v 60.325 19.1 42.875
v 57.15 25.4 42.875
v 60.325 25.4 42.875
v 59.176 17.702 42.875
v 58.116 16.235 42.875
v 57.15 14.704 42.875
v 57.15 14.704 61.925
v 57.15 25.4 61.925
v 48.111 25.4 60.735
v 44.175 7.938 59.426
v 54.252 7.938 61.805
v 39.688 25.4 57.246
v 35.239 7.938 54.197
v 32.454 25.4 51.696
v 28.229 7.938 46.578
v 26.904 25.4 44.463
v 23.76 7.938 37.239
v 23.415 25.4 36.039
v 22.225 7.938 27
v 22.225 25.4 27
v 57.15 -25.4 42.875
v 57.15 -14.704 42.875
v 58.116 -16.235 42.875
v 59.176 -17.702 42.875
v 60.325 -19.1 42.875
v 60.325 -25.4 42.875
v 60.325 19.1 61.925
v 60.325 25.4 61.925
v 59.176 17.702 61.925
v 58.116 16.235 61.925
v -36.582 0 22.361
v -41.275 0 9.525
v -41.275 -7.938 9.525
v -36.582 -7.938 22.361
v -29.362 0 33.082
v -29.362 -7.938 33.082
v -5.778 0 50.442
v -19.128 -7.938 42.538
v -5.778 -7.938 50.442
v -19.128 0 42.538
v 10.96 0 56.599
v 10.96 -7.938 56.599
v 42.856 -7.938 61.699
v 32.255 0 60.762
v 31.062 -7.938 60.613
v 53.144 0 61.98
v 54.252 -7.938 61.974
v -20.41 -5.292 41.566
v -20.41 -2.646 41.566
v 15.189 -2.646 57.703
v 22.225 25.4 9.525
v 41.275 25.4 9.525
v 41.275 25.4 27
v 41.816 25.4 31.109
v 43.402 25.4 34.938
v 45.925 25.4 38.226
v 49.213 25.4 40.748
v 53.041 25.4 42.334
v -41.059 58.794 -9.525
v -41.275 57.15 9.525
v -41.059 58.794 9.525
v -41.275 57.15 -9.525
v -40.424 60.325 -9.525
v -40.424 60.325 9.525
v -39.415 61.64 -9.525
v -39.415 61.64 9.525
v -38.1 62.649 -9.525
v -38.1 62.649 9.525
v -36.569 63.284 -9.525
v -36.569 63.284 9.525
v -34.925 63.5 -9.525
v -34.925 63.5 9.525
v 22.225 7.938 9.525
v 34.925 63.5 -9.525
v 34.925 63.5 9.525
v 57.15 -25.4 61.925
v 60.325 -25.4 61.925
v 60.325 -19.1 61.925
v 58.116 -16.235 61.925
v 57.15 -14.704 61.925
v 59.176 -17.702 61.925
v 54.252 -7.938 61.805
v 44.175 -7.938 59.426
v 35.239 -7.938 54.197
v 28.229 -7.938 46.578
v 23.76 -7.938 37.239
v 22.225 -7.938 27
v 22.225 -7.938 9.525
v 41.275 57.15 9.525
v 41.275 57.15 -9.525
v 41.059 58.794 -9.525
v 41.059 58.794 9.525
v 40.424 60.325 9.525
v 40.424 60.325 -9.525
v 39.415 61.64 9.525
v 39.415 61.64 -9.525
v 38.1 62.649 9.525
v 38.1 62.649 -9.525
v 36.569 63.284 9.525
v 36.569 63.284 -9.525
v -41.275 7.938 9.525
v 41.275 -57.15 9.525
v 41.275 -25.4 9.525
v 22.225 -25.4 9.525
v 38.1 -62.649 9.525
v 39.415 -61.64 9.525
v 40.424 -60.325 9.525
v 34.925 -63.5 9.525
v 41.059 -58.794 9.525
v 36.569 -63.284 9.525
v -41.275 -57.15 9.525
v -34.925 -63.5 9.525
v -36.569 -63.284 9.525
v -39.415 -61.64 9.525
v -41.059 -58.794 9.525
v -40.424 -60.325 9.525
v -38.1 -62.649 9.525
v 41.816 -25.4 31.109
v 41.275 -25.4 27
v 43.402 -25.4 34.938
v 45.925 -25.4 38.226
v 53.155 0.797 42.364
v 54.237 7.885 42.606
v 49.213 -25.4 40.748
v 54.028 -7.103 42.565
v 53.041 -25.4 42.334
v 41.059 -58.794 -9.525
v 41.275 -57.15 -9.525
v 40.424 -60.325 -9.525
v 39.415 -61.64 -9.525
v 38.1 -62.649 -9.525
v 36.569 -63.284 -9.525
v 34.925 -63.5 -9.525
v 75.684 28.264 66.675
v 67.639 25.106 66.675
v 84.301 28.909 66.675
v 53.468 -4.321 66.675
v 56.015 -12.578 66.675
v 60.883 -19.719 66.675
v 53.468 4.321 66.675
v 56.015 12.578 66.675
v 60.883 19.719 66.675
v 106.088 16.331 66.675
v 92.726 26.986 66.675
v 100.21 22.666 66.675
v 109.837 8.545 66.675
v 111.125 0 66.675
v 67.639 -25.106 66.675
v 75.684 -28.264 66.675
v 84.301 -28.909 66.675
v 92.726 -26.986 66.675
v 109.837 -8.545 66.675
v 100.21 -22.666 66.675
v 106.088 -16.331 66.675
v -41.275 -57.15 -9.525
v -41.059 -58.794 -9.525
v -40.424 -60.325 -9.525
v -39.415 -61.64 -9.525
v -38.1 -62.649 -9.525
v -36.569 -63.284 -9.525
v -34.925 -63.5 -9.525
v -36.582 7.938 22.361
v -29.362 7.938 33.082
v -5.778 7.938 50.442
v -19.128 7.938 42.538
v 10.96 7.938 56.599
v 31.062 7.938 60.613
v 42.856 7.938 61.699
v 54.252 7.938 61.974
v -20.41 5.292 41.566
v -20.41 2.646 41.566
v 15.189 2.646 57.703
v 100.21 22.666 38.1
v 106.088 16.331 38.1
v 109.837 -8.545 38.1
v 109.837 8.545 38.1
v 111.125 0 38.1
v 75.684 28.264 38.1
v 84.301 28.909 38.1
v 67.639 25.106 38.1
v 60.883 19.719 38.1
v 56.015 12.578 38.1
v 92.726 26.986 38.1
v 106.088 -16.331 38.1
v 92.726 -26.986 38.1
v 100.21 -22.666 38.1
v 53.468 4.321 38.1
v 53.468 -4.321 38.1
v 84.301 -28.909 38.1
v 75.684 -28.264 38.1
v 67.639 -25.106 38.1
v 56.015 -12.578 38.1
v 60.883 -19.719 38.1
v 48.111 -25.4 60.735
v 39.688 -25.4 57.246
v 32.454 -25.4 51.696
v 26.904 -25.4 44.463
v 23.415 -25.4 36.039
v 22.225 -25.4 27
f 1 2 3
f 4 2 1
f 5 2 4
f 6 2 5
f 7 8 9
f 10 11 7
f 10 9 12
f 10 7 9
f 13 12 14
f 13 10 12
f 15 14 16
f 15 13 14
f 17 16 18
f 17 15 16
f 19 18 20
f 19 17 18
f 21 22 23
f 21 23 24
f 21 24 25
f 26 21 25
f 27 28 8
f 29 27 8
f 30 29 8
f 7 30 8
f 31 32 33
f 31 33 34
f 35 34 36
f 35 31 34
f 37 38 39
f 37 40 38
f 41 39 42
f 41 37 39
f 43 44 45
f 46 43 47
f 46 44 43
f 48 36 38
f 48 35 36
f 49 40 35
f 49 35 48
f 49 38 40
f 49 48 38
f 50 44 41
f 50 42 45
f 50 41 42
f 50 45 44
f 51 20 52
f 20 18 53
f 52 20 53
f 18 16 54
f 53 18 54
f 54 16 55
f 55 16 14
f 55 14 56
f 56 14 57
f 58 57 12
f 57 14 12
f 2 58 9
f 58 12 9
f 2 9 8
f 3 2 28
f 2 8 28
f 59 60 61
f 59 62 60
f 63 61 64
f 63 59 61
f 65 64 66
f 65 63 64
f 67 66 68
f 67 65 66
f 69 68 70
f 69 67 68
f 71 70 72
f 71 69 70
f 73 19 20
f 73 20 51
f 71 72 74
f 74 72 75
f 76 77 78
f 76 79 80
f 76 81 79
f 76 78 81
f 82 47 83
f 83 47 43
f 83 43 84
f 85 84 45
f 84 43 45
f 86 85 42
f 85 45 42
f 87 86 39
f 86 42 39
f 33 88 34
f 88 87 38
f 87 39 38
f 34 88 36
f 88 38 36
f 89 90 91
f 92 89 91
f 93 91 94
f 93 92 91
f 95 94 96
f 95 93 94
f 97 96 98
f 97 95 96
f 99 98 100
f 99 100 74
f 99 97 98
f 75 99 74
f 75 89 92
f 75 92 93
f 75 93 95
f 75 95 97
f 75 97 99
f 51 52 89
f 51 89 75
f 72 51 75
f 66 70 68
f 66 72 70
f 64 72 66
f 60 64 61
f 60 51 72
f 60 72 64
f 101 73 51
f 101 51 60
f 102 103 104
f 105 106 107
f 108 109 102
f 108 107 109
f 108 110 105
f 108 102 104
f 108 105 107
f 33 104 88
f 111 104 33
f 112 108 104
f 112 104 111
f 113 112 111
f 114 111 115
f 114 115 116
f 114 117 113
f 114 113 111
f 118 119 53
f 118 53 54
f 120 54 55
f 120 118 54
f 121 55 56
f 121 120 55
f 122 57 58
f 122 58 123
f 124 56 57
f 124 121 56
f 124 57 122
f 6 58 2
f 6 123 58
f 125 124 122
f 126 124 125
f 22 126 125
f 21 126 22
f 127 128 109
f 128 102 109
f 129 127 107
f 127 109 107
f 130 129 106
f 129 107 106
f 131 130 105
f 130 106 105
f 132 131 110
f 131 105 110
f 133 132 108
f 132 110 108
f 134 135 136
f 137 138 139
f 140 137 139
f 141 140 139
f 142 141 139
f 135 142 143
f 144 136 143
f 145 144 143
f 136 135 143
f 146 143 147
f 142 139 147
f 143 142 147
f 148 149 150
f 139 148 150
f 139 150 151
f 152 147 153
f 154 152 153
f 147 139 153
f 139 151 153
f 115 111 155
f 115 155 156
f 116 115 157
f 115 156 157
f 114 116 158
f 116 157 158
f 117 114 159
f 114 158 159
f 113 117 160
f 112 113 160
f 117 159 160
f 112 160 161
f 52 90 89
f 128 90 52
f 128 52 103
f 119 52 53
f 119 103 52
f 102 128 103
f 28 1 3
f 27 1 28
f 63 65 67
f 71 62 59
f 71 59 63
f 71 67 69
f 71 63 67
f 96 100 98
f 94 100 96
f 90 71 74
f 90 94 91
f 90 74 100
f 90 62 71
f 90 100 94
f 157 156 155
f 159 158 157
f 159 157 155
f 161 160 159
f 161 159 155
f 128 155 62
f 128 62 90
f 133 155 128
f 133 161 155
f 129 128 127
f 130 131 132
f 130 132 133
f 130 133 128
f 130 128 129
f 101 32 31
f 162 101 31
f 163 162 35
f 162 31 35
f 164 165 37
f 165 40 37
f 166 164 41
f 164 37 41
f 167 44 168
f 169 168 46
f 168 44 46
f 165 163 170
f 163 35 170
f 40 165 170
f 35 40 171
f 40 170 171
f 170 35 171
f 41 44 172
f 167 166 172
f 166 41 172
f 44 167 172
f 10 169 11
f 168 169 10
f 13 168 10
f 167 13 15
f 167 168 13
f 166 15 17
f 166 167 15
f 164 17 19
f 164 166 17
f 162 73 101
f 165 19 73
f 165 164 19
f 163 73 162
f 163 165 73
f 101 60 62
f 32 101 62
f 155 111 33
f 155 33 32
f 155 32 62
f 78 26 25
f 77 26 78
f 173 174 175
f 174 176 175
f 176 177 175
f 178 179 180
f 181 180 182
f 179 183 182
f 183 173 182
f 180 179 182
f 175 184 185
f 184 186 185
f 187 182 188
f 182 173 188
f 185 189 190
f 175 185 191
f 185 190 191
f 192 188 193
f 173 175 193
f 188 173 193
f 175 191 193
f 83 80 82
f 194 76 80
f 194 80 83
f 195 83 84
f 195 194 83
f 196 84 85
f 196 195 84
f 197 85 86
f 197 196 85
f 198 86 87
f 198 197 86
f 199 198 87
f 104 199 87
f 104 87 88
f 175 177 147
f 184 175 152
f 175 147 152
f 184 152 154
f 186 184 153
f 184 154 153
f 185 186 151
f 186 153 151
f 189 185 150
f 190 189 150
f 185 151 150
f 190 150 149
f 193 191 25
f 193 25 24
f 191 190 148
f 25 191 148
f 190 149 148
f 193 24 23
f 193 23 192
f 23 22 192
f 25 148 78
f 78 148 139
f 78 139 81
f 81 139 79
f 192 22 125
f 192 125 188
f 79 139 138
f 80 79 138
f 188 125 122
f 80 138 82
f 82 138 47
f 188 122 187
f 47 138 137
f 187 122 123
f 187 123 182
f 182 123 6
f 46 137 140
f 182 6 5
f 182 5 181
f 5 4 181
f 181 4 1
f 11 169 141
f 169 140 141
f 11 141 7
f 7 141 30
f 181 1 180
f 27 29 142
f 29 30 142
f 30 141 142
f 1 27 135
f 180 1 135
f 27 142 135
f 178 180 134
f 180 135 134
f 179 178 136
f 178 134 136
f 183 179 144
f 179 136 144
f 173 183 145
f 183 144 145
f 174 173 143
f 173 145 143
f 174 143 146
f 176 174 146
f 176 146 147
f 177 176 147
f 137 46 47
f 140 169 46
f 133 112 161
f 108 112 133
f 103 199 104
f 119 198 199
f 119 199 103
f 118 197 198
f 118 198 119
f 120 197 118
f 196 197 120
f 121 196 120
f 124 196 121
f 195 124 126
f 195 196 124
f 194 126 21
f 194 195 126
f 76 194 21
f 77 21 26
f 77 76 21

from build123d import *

# Parameters (mm, degrees)
F1_DEPTH = 63.5
F2_DEPTH = 25.4
F3_DEPTH = 7.9375
F5_R     = 6.35


with BuildPart() as f1:
    # F0 (on Front) → F1 (new body, symmetric)
    with BuildSketch(Plane.XZ):
        Polygon((-41.275, 9.525), (-41.275, -9.525), (41.275, -9.525), (41.275, 9.525), (22.225, 9.525), align=None)
    extrude(amount=F1_DEPTH, both=True)

    # F0 (on Front) → F2 (join, symmetric)
    with BuildSketch(Plane.XZ):
        with BuildLine():
            Line((22.225, 9.525), (41.275, 9.525))
            Line((41.275, 9.525), (41.275, 27.0002))
            ThreePointArc((41.275, 27.0002), (45.92468, 38.22552), (57.15, 42.8752))
            Line((57.15, 42.8752), (60.325, 42.8752))
            Line((60.325, 42.8752), (60.325, 61.9252))
            Line((60.325, 61.9252), (57.15, 61.9252))
            ThreePointArc((57.15, 61.9252), (32.454296, 51.695904), (22.225, 27.0002))
            Line((22.225, 27.0002), (22.225, 9.525))
        make_face()
    extrude(amount=F2_DEPTH, both=True)

    # F0 (on Front) → F3 (join, symmetric)
    with BuildSketch(Plane.XZ):
        with BuildLine():
            add(Edge.make_bspline(
                [(-41.275, 9.525), (-31.276178, 51.95152), (19.80542, 62.86972), (57.15, 61.9252)],
                knots=[0, 0, 0, 0, 111.504536, 111.504536, 111.504536, 111.504536], degree=3))
            Line((-41.275, 9.525), (22.225, 9.525))
            Line((22.225, 9.525), (22.225, 27.0002))
            ThreePointArc((22.225, 27.0002), (32.454296, 51.695904), (57.15, 61.9252))
        make_face()
    extrude(amount=F3_DEPTH, both=True)

    # F0 (on Front) → F4 (revolve)
    with BuildSketch(Plane.XZ):
        Polygon((82.134529, 66.675), (82.134529, 61.9252), (82.134529, 42.8752), (82.134529, 38.1), (111.125, 38.1), (111.125, 66.675), align=None)
    revolve(axis=Axis((82.134529, 0, 52.3875), (0, 0, -1)))

    # F5
    f5_edges = [f1.edges().sort_by_distance(p)[0] for p in [
        (41.275, -63.5, 0),
        (-41.275, -63.5, 0),
        (41.275, 63.5, 0),
        (-41.275, 63.5, 0),
    ]]
    fillet(f5_edges, radius=F5_R)


solid = f1.part
